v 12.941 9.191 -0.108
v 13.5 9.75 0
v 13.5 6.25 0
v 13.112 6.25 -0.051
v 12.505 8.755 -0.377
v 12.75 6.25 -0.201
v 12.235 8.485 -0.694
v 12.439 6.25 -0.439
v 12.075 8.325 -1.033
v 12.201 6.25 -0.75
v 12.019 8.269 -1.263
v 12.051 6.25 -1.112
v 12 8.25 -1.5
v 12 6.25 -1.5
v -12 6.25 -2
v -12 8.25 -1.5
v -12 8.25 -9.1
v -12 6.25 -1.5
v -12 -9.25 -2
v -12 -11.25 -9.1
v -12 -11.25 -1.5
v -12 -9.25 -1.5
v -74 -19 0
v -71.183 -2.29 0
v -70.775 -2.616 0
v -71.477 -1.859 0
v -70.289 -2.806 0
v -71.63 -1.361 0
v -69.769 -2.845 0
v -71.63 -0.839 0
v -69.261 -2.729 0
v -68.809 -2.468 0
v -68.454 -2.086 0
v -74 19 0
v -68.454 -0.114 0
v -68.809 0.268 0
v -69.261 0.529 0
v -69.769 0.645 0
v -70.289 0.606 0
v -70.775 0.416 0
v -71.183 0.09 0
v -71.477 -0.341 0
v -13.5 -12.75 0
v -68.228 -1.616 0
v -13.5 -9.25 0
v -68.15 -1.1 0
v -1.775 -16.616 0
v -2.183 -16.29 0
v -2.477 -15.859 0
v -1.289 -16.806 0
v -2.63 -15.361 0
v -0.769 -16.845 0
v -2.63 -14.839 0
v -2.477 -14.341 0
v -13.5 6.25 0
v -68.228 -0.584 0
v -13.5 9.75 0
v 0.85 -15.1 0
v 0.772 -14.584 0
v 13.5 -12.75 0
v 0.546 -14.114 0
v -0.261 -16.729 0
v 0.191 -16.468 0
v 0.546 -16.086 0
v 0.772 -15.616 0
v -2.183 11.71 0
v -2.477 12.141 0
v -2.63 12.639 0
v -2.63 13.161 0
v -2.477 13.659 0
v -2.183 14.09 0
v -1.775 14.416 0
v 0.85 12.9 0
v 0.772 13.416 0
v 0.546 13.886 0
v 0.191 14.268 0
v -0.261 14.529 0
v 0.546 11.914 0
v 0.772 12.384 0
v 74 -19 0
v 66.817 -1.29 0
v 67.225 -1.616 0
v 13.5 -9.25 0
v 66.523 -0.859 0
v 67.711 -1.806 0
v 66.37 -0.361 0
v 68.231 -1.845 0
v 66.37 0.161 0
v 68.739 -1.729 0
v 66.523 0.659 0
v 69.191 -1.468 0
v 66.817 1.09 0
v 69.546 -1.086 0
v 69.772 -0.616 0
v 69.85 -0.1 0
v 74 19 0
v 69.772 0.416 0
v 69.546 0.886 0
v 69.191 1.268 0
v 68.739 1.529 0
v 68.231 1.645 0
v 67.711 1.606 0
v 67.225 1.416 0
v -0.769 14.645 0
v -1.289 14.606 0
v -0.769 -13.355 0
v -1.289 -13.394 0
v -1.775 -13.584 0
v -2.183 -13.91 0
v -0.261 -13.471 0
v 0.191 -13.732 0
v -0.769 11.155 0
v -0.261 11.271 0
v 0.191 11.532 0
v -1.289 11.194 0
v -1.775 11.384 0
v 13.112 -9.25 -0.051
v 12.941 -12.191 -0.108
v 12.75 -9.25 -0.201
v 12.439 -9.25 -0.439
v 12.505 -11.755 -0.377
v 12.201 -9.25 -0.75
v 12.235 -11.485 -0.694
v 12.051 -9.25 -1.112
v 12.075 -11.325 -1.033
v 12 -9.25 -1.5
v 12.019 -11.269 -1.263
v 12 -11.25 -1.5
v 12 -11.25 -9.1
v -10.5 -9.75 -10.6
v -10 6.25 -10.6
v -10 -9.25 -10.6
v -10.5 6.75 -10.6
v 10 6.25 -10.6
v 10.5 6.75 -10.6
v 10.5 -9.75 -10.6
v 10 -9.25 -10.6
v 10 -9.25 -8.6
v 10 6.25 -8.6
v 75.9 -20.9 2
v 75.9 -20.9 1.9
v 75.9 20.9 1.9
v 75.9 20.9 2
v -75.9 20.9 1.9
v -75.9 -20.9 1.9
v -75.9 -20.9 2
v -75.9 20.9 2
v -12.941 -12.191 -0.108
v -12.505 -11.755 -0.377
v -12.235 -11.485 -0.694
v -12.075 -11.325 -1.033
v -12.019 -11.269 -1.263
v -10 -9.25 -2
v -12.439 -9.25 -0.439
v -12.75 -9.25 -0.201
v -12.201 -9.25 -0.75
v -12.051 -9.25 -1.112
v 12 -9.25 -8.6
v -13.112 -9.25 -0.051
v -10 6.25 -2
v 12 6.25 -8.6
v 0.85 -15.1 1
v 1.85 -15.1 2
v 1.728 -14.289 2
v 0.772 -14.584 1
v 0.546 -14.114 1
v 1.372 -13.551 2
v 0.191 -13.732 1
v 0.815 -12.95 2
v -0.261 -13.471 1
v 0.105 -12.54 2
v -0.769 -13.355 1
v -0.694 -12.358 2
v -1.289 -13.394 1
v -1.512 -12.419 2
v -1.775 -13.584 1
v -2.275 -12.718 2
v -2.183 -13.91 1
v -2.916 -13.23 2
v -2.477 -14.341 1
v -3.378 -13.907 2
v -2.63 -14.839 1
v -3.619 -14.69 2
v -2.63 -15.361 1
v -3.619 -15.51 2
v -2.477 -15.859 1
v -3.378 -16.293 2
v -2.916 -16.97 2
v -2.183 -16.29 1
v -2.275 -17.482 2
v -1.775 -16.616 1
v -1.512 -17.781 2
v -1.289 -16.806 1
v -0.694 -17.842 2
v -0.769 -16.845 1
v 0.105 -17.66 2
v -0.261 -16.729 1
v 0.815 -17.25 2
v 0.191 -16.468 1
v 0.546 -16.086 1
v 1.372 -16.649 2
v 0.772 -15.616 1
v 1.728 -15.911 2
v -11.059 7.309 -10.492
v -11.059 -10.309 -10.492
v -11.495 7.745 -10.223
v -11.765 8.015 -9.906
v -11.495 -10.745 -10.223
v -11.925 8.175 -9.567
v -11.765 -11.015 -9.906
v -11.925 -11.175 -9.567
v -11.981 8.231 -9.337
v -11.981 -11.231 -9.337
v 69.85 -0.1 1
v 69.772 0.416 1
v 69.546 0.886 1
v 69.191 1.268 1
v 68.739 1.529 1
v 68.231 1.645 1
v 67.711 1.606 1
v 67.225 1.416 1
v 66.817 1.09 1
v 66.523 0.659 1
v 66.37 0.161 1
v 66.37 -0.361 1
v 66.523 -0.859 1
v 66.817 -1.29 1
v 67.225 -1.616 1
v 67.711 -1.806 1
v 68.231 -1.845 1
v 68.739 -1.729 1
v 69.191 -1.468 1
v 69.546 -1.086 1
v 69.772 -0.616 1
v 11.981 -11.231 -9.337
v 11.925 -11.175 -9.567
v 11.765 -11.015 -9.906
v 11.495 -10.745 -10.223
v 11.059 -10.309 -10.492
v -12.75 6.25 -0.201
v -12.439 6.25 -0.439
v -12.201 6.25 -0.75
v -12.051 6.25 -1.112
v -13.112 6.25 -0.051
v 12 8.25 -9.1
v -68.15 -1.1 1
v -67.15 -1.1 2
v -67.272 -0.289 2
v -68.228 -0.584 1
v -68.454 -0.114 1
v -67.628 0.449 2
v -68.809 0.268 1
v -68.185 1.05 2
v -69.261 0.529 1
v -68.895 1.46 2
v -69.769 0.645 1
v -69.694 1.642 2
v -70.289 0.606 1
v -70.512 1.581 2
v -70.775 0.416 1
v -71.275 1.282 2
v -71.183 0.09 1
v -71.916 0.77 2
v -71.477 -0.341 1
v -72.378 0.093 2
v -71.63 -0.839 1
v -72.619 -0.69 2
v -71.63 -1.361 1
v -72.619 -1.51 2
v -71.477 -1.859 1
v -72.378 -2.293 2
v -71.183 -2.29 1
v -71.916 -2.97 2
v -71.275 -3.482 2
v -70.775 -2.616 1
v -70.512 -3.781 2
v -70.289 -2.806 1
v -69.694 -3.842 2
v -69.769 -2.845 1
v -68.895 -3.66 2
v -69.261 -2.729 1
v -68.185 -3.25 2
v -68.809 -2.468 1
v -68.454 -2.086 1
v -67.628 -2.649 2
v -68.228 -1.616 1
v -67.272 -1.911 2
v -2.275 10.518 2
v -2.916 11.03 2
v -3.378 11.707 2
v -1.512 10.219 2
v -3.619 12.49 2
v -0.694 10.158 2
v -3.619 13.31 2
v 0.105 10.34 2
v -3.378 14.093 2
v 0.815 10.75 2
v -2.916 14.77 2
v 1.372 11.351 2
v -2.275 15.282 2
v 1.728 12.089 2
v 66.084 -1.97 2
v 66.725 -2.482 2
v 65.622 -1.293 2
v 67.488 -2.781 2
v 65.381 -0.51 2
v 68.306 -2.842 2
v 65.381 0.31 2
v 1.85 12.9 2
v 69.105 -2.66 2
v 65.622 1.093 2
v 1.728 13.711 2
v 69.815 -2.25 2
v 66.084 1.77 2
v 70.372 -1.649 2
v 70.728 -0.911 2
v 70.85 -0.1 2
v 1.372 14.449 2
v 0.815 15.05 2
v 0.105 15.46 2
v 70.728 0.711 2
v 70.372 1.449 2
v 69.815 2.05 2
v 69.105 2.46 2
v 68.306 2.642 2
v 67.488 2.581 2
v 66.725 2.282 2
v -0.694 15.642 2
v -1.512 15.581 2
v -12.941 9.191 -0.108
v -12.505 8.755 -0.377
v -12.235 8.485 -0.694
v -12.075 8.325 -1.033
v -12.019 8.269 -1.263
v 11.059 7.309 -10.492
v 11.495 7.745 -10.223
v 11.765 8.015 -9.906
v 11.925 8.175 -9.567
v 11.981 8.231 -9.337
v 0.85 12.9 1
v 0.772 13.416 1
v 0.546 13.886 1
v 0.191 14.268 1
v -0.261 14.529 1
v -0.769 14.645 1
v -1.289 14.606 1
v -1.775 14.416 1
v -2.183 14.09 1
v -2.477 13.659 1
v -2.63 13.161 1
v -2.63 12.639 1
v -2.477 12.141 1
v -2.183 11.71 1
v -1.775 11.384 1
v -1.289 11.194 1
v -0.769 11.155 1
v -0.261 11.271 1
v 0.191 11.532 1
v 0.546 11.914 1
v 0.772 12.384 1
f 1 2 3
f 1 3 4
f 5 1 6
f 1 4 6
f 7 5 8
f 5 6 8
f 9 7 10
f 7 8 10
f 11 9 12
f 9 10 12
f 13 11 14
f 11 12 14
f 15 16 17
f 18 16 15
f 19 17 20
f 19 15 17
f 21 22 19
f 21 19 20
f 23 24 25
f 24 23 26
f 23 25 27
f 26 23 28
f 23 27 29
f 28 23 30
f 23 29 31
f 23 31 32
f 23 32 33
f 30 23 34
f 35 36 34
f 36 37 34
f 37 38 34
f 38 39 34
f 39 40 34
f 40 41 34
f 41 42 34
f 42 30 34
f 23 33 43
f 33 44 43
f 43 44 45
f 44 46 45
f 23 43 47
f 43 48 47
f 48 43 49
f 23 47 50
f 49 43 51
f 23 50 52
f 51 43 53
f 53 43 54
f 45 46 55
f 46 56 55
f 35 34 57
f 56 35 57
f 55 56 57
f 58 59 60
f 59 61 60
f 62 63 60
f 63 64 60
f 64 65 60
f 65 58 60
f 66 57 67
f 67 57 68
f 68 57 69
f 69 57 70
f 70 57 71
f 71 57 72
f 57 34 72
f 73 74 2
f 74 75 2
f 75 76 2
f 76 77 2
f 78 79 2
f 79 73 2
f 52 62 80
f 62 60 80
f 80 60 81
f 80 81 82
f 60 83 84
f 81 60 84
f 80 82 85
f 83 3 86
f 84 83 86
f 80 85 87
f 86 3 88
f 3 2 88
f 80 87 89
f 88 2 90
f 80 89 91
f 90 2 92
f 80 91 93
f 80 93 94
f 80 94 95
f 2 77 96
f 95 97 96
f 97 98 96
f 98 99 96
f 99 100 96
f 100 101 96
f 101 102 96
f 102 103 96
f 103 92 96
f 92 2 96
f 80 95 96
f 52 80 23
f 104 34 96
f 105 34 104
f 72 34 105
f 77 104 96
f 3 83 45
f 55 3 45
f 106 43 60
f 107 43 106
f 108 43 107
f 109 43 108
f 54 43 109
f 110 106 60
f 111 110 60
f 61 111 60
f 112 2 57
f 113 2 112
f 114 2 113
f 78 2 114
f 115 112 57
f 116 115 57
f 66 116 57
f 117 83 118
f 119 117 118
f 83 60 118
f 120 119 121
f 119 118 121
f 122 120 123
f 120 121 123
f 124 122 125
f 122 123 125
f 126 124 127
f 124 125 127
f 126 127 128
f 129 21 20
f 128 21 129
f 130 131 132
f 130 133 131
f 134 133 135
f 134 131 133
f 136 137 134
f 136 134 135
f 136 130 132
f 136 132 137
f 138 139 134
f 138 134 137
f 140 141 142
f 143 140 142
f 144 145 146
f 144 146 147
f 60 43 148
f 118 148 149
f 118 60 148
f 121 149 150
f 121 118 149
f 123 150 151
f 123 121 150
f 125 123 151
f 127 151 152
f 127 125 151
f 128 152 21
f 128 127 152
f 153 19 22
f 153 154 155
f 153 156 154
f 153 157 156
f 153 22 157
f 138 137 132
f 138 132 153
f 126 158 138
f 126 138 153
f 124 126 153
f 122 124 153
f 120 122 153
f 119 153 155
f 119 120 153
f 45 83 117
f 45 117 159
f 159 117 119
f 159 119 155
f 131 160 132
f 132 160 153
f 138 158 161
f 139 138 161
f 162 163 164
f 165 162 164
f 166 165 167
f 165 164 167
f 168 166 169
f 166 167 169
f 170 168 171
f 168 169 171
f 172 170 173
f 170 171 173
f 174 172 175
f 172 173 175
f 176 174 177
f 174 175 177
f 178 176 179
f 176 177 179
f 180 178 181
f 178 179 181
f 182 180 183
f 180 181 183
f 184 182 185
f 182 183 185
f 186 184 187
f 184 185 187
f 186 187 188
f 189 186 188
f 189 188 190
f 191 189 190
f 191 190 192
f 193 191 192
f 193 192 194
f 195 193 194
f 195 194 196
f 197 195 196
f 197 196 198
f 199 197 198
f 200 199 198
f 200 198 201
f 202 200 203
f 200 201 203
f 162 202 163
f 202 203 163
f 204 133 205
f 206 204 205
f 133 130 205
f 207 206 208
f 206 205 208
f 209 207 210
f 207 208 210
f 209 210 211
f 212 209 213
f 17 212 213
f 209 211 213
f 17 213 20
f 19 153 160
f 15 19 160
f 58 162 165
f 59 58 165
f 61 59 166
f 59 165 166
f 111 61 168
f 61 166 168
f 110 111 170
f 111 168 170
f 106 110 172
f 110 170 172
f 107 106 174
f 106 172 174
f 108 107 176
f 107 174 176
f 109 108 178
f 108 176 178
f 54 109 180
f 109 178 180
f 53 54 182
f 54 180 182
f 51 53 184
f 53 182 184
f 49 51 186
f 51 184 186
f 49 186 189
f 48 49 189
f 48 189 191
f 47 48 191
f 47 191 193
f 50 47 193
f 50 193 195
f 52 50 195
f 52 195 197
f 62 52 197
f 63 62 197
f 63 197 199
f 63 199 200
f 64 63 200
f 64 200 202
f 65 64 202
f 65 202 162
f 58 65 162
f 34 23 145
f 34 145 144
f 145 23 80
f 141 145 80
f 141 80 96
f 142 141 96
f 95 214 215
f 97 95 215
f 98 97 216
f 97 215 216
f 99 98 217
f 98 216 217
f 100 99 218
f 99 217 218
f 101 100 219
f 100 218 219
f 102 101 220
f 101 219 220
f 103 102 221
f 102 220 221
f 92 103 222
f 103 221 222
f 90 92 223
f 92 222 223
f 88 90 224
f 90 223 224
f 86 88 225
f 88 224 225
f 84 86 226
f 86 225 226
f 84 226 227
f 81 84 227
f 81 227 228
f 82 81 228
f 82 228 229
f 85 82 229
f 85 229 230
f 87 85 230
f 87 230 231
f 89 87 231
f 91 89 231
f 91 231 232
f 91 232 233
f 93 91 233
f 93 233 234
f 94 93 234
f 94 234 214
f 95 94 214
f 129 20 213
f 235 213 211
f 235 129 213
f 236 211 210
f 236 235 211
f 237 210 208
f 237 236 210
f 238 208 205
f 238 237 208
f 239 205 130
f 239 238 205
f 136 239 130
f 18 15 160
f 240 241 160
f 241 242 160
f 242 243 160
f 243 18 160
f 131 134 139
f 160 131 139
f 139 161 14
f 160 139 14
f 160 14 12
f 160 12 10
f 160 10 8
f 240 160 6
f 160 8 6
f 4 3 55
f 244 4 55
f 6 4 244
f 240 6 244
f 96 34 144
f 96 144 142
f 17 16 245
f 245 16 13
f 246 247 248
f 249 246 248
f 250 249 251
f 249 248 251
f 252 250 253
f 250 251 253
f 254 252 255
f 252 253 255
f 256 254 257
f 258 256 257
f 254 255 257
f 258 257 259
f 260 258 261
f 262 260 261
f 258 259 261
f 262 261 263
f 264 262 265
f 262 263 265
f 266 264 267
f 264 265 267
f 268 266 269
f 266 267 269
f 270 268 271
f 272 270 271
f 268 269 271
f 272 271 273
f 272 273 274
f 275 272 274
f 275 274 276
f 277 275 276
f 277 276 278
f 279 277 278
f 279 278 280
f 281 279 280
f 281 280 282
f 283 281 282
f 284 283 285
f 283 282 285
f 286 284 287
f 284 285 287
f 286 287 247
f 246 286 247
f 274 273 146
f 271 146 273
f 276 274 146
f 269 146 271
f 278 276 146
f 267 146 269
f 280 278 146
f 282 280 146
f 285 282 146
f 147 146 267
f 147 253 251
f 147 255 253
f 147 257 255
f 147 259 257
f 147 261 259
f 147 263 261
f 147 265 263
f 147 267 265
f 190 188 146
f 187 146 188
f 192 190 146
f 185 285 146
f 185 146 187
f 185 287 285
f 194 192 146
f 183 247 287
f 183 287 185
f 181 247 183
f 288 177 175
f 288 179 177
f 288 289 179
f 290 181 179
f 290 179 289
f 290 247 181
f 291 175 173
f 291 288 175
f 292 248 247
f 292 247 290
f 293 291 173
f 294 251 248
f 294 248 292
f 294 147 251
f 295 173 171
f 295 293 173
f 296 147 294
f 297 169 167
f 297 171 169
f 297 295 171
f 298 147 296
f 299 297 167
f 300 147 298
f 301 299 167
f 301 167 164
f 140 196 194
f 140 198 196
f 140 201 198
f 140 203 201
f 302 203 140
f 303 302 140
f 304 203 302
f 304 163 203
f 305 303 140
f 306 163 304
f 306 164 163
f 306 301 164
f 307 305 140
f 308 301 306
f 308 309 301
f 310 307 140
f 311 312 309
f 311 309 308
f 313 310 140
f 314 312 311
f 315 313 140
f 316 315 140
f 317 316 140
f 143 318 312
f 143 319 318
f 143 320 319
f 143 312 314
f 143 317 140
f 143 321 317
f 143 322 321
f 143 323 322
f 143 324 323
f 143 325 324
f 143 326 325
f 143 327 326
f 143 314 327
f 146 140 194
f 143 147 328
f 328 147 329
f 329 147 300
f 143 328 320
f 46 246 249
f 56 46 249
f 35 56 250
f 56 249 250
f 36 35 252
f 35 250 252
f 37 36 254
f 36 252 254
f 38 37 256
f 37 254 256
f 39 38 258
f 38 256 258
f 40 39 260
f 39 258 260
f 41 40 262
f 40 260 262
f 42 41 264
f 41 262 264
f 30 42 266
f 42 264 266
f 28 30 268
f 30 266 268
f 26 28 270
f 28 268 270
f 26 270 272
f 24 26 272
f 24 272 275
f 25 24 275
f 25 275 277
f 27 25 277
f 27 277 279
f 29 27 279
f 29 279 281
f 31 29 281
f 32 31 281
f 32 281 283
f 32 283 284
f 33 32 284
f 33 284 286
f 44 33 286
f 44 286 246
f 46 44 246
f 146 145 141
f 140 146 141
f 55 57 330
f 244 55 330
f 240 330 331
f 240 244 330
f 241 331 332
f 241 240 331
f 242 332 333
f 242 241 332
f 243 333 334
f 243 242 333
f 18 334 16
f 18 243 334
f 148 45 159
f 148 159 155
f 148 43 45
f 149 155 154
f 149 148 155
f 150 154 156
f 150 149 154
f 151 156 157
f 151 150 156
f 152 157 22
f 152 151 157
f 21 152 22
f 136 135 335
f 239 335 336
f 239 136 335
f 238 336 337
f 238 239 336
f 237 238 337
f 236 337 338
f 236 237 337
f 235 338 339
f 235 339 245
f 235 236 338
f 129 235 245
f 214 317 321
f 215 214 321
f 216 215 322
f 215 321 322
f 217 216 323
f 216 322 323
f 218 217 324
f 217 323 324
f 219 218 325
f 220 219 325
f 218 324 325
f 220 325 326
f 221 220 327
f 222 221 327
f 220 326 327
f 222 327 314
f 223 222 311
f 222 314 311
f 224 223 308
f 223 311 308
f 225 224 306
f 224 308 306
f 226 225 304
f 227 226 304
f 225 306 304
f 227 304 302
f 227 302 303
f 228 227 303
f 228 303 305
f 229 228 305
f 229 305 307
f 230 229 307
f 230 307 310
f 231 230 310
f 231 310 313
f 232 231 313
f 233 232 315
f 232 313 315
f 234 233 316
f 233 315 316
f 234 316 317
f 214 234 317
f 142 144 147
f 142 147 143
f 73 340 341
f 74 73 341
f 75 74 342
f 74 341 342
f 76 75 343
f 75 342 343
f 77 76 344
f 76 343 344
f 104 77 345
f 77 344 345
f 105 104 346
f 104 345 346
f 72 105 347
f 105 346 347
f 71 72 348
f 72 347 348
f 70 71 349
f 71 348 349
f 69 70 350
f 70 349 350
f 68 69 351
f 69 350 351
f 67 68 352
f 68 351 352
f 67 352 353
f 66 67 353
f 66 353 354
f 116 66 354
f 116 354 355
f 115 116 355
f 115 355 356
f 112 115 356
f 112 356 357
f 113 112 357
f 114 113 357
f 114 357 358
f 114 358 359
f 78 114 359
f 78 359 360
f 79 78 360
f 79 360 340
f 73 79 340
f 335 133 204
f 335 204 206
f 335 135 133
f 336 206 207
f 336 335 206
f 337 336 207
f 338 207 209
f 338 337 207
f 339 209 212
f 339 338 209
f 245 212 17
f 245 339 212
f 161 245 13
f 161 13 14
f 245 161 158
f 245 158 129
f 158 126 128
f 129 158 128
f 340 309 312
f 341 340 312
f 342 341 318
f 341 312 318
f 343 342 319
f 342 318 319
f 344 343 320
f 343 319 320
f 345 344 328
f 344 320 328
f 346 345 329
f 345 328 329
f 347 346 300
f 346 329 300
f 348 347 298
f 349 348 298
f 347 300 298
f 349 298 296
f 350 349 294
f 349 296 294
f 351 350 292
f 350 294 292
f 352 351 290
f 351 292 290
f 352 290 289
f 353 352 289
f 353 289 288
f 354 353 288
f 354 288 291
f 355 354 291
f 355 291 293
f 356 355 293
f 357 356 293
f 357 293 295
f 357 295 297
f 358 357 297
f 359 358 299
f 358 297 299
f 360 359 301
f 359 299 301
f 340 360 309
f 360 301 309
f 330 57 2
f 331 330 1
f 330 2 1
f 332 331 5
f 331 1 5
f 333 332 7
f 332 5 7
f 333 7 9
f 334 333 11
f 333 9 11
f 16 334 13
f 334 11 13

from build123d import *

# Parameters (mm, degrees)
SKETCH_W           = 151.8
SKETCH_H           = 41.8
PAD_DEPTH          = 2
CHAMFER_SIZE       = 1.9
SKETCH001_W        = 2
SKETCH001_H        = 2
PAD001_DEPTH       = 8.6
SKETCH002_W        = 15.5
SKETCH002_H        = 2
POCKET_DEPTH       = 2
SKETCH003_W        = 24
SKETCH003_H        = 19.5
PAD002_DEPTH       = 2
PAD003_START       = -0.75
SKETCH004_W        = 8
SKETCH004_H        = 0.6
PAD003_DEPTH       = 0.5
CHAMFER001_1_ANGLE = 53
CHAMFER001_1_SIZE  = 0.55
CHAMFER001_2_ANGLE = 53
CHAMFER001_2_SIZE  = 0.55
FILLET_R           = 1
FILLET001_R        = 1
SKETCH005_R        = 1.75
POCKET001_DEPTH    = 3
CHAMFER002_SIZE    = 1
SKETCH006_W        = 15.5
SKETCH006_H        = 8.6
POCKET002_DEPTH    = 5
SKETCH007_W        = 20
SKETCH007_H        = 15.5
POCKET003_DEPTH    = 5
SKETCH008_W        = 26
SKETCH008_H        = 21.5
POCKET004_DEPTH    = 10.6
SKETCH009_W        = 24
SKETCH009_H        = 19.5
SKETCH009_W_2      = 20
SKETCH009_H_2      = 15.5
PAD004_DEPTH       = 10.6
SKETCH010_W        = 15.5
SKETCH010_H        = 8.6
POCKET005_DEPTH    = 5
SKETCH011_W        = 15.5
SKETCH011_H        = 2
POCKET006_DEPTH    = 5
FILLET002_R        = 1.5


with BuildPart() as part:
    # Sketch → Pad (new body)
    with BuildSketch(Plane.XY):
        Rectangle(SKETCH_W, SKETCH_H)
    extrude(amount=PAD_DEPTH)

    # Chamfer
    chamfer_edges = [part.edges().sort_by_distance(p)[0] for p in [
        (0, -20.9, 0),
        (-75.9, 0, 0),
        (0, 20.9, 0),
        (75.9, 0, 0),
    ]]
    chamfer(chamfer_edges, length=CHAMFER_SIZE)

    # Sketch001 (on Face8 of Chamfer) → Pad001 (join)
    with BuildSketch(Plane(origin=(0, 0, 0), x_dir=(1, 0, 0), z_dir=(0, 0, -1))):
        Polygon((-11, 7.75), (-9, 7.75), (-9, 9.75), (-13, 9.75), (-13, -9.75), (-9, -9.75), (-9, -7.75), (-11, -7.75), align=None)
        with Locations((10, 8.75)):
            Rectangle(SKETCH001_W, SKETCH001_H)
        with Locations((10, -8.75)):
            Rectangle(SKETCH001_W, SKETCH001_H)
    extrude(amount=PAD001_DEPTH)

    # Sketch002 (on Face19 of Pad001) → Pocket (cut)
    with BuildSketch(Plane(origin=(-13, 0, 0), x_dir=(0, -1, 0), z_dir=(-1, 0, 0))):
        with Locations((0, -1)):
            Rectangle(SKETCH002_W, SKETCH002_H)
    extrude(amount=-POCKET_DEPTH, mode=Mode.SUBTRACT)

    # Sketch003 (on Face31 of Pocket) → Pad002 (join)
    with BuildSketch(Plane(origin=(0, 0, -8.6), x_dir=(1, 0, 0), z_dir=(0, 0, -1))):
        with Locations((-1, 0)):
            Rectangle(SKETCH003_W, SKETCH003_H)
        Polygon((-11, 7.75), (-1.5, 0), (-11, -7.75), align=None, mode=Mode.SUBTRACT)
        Polygon((9, 7.75), (1.5, 0), (9, -7.75), align=None, mode=Mode.SUBTRACT)
        Polygon((7, -7.75), (0, -1.5), (-9, -7.75), align=None, mode=Mode.SUBTRACT)
        Polygon((-9, 7.75), (0, 1.5), (7, 7.75), align=None, mode=Mode.SUBTRACT)
    extrude(amount=PAD002_DEPTH)

    # Sketch004 (on Face34 of Pad002) → Pad003 (join)
    with BuildSketch(Plane.YZ.offset(11).offset(PAD003_START)):
        with Locations((0, -8.3)):
            Rectangle(SKETCH004_W, SKETCH004_H)
    extrude(amount=-PAD003_DEPTH)

    # Chamfer001 1
    chamfer001_1_edges = [part.edges().sort_by_distance(p)[0] for p in [
        (10.25, 0, -8.6),
    ]]
    chamfer001_1_side = part.faces().sort_by_distance((10.25, 0, -8.3))[0]
    chamfer(chamfer001_1_edges, length=CHAMFER001_1_SIZE, angle=CHAMFER001_1_ANGLE, reference=chamfer001_1_side)

    # Chamfer001 2
    chamfer001_2_edges = [part.edges().sort_by_distance(p)[0] for p in [
        (9.75, 0, -8.6),
    ]]
    chamfer001_2_side = part.faces().sort_by_distance((9.75, 0, -8.3))[0]
    chamfer(chamfer001_2_edges, length=CHAMFER001_2_SIZE, angle=CHAMFER001_2_ANGLE, reference=chamfer001_2_side)

    # Fillet
    fillet_edges = [part.edges().sort_by_distance(p)[0] for p in [
        (10, -9.75, 0),
        (11, -8.75, 0),
        (9, -8.75, 0),
        (9, 8.75, 0),
        (10, 9.75, 0),
        (11, 8.75, 0),
        (-11, -9.75, 0),
        (-9, -8.75, 0),
        (-13, -8.75, 0),
        (-13, 8.75, 0),
        (-11, 9.75, 0),
        (-9, 8.75, 0),
        (11, -9.75, -5.3),
        (11, 9.75, -5.3),
        (-13, 9.75, -5.3),
        (-13, -9.75, -5.3),
    ]]
    fillet(fillet_edges, radius=FILLET_R)

    # Fillet001
    fillet001_edges = [part.edges().sort_by_distance(p)[0] for p in [
        (10.707107, -9.457107, -10.6),
    ]]
    fillet(fillet001_edges, radius=FILLET001_R)

    # Sketch005 (on Face73 of Fillet001) → Pocket001 (cut)
    with BuildSketch(Plane.XY.offset(2)):
        with Locations((-69.9, -1.1)):
            Circle(SKETCH005_R)
        with Locations((68.1, -0.1)):
            Circle(SKETCH005_R)
        with Locations((-0.9, -15.1)):
            Circle(SKETCH005_R)
        with Locations((-0.9, 12.9)):
            Circle(SKETCH005_R)
    extrude(amount=-POCKET001_DEPTH, mode=Mode.SUBTRACT)

    # Chamfer002
    chamfer002_edges = [part.edges().sort_by_distance(p)[0] for p in [
        (-2.65, 12.9, 2),
        (-71.65, -1.1, 2),
        (-2.65, -15.1, 2),
        (66.35, -0.1, 2),
    ]]
    chamfer(chamfer002_edges, length=CHAMFER002_SIZE)

    # Sketch006 (on Face46 of Chamfer002) → Pocket002 (cut)
    with BuildSketch(Plane.YZ.offset(11)):
        with Locations((0, -4.3)):
            Rectangle(SKETCH006_W, SKETCH006_H)
    extrude(amount=-POCKET002_DEPTH, mode=Mode.SUBTRACT)

    # Sketch007 (on Face59 of Pocket002) → Pocket003 (cut)
    with BuildSketch(Plane(origin=(0, 0, -10.6), x_dir=(1, 0, 0), z_dir=(0, 0, -1))):
        with Locations((-1, 0)):
            Rectangle(SKETCH007_W, SKETCH007_H)
    extrude(amount=-POCKET003_DEPTH, mode=Mode.SUBTRACT)

    # Sketch008 (on Face58 of Pocket003) → Pocket004 (cut)
    with BuildSketch(Plane(origin=(0, 0, -10.6), x_dir=(1, 0, 0), z_dir=(0, 0, -1))):
        with Locations((-1, 0)):
            Rectangle(SKETCH008_W, SKETCH008_H)
    extrude(amount=-POCKET004_DEPTH, mode=Mode.SUBTRACT)

    # Sketch009 (on Face18 of Pocket004) → Pad004 (join)
    with BuildSketch(Plane(origin=(0, 0, 0), x_dir=(1, 0, 0), z_dir=(0, 0, -1))):
        with Locations((0, 1.5)):
            Rectangle(SKETCH009_W, SKETCH009_H)
        with Locations((0, 1.5)):
            Rectangle(SKETCH009_W_2, SKETCH009_H_2, mode=Mode.SUBTRACT)
    extrude(amount=PAD004_DEPTH)

    # Sketch010 (on Face11 of Pad004) → Pocket005 (cut)
    with BuildSketch(Plane.YZ.offset(12)):
        with Locations((-1.5, -4.3)):
            Rectangle(SKETCH010_W, SKETCH010_H)
    extrude(amount=-POCKET005_DEPTH, mode=Mode.SUBTRACT)

    # Sketch011 (on Face31 of Pocket005) → Pocket006 (cut)
    with BuildSketch(Plane.YZ.offset(-10)):
        with Locations((-1.5, -1)):
            Rectangle(SKETCH011_W, SKETCH011_H)
    extrude(amount=-POCKET006_DEPTH, mode=Mode.SUBTRACT)

    # Fillet002
    fillet002_edges = [part.edges().sort_by_distance(p)[0] for p in [
        (12, -10.25, 0),
        (0, -11.25, 0),
        (-12, -10.25, 0),
        (0, 8.25, 0),
        (12, 7.25, 0),
        (12, -1.5, -10.6),
        (0, 8.25, -10.6),
        (-12, -1.5, -10.6),
        (0, -11.25, -10.6),
        (-12, 7.25, 0),
    ]]
    fillet(fillet002_edges, radius=FILLET002_R)


solid = part.part
